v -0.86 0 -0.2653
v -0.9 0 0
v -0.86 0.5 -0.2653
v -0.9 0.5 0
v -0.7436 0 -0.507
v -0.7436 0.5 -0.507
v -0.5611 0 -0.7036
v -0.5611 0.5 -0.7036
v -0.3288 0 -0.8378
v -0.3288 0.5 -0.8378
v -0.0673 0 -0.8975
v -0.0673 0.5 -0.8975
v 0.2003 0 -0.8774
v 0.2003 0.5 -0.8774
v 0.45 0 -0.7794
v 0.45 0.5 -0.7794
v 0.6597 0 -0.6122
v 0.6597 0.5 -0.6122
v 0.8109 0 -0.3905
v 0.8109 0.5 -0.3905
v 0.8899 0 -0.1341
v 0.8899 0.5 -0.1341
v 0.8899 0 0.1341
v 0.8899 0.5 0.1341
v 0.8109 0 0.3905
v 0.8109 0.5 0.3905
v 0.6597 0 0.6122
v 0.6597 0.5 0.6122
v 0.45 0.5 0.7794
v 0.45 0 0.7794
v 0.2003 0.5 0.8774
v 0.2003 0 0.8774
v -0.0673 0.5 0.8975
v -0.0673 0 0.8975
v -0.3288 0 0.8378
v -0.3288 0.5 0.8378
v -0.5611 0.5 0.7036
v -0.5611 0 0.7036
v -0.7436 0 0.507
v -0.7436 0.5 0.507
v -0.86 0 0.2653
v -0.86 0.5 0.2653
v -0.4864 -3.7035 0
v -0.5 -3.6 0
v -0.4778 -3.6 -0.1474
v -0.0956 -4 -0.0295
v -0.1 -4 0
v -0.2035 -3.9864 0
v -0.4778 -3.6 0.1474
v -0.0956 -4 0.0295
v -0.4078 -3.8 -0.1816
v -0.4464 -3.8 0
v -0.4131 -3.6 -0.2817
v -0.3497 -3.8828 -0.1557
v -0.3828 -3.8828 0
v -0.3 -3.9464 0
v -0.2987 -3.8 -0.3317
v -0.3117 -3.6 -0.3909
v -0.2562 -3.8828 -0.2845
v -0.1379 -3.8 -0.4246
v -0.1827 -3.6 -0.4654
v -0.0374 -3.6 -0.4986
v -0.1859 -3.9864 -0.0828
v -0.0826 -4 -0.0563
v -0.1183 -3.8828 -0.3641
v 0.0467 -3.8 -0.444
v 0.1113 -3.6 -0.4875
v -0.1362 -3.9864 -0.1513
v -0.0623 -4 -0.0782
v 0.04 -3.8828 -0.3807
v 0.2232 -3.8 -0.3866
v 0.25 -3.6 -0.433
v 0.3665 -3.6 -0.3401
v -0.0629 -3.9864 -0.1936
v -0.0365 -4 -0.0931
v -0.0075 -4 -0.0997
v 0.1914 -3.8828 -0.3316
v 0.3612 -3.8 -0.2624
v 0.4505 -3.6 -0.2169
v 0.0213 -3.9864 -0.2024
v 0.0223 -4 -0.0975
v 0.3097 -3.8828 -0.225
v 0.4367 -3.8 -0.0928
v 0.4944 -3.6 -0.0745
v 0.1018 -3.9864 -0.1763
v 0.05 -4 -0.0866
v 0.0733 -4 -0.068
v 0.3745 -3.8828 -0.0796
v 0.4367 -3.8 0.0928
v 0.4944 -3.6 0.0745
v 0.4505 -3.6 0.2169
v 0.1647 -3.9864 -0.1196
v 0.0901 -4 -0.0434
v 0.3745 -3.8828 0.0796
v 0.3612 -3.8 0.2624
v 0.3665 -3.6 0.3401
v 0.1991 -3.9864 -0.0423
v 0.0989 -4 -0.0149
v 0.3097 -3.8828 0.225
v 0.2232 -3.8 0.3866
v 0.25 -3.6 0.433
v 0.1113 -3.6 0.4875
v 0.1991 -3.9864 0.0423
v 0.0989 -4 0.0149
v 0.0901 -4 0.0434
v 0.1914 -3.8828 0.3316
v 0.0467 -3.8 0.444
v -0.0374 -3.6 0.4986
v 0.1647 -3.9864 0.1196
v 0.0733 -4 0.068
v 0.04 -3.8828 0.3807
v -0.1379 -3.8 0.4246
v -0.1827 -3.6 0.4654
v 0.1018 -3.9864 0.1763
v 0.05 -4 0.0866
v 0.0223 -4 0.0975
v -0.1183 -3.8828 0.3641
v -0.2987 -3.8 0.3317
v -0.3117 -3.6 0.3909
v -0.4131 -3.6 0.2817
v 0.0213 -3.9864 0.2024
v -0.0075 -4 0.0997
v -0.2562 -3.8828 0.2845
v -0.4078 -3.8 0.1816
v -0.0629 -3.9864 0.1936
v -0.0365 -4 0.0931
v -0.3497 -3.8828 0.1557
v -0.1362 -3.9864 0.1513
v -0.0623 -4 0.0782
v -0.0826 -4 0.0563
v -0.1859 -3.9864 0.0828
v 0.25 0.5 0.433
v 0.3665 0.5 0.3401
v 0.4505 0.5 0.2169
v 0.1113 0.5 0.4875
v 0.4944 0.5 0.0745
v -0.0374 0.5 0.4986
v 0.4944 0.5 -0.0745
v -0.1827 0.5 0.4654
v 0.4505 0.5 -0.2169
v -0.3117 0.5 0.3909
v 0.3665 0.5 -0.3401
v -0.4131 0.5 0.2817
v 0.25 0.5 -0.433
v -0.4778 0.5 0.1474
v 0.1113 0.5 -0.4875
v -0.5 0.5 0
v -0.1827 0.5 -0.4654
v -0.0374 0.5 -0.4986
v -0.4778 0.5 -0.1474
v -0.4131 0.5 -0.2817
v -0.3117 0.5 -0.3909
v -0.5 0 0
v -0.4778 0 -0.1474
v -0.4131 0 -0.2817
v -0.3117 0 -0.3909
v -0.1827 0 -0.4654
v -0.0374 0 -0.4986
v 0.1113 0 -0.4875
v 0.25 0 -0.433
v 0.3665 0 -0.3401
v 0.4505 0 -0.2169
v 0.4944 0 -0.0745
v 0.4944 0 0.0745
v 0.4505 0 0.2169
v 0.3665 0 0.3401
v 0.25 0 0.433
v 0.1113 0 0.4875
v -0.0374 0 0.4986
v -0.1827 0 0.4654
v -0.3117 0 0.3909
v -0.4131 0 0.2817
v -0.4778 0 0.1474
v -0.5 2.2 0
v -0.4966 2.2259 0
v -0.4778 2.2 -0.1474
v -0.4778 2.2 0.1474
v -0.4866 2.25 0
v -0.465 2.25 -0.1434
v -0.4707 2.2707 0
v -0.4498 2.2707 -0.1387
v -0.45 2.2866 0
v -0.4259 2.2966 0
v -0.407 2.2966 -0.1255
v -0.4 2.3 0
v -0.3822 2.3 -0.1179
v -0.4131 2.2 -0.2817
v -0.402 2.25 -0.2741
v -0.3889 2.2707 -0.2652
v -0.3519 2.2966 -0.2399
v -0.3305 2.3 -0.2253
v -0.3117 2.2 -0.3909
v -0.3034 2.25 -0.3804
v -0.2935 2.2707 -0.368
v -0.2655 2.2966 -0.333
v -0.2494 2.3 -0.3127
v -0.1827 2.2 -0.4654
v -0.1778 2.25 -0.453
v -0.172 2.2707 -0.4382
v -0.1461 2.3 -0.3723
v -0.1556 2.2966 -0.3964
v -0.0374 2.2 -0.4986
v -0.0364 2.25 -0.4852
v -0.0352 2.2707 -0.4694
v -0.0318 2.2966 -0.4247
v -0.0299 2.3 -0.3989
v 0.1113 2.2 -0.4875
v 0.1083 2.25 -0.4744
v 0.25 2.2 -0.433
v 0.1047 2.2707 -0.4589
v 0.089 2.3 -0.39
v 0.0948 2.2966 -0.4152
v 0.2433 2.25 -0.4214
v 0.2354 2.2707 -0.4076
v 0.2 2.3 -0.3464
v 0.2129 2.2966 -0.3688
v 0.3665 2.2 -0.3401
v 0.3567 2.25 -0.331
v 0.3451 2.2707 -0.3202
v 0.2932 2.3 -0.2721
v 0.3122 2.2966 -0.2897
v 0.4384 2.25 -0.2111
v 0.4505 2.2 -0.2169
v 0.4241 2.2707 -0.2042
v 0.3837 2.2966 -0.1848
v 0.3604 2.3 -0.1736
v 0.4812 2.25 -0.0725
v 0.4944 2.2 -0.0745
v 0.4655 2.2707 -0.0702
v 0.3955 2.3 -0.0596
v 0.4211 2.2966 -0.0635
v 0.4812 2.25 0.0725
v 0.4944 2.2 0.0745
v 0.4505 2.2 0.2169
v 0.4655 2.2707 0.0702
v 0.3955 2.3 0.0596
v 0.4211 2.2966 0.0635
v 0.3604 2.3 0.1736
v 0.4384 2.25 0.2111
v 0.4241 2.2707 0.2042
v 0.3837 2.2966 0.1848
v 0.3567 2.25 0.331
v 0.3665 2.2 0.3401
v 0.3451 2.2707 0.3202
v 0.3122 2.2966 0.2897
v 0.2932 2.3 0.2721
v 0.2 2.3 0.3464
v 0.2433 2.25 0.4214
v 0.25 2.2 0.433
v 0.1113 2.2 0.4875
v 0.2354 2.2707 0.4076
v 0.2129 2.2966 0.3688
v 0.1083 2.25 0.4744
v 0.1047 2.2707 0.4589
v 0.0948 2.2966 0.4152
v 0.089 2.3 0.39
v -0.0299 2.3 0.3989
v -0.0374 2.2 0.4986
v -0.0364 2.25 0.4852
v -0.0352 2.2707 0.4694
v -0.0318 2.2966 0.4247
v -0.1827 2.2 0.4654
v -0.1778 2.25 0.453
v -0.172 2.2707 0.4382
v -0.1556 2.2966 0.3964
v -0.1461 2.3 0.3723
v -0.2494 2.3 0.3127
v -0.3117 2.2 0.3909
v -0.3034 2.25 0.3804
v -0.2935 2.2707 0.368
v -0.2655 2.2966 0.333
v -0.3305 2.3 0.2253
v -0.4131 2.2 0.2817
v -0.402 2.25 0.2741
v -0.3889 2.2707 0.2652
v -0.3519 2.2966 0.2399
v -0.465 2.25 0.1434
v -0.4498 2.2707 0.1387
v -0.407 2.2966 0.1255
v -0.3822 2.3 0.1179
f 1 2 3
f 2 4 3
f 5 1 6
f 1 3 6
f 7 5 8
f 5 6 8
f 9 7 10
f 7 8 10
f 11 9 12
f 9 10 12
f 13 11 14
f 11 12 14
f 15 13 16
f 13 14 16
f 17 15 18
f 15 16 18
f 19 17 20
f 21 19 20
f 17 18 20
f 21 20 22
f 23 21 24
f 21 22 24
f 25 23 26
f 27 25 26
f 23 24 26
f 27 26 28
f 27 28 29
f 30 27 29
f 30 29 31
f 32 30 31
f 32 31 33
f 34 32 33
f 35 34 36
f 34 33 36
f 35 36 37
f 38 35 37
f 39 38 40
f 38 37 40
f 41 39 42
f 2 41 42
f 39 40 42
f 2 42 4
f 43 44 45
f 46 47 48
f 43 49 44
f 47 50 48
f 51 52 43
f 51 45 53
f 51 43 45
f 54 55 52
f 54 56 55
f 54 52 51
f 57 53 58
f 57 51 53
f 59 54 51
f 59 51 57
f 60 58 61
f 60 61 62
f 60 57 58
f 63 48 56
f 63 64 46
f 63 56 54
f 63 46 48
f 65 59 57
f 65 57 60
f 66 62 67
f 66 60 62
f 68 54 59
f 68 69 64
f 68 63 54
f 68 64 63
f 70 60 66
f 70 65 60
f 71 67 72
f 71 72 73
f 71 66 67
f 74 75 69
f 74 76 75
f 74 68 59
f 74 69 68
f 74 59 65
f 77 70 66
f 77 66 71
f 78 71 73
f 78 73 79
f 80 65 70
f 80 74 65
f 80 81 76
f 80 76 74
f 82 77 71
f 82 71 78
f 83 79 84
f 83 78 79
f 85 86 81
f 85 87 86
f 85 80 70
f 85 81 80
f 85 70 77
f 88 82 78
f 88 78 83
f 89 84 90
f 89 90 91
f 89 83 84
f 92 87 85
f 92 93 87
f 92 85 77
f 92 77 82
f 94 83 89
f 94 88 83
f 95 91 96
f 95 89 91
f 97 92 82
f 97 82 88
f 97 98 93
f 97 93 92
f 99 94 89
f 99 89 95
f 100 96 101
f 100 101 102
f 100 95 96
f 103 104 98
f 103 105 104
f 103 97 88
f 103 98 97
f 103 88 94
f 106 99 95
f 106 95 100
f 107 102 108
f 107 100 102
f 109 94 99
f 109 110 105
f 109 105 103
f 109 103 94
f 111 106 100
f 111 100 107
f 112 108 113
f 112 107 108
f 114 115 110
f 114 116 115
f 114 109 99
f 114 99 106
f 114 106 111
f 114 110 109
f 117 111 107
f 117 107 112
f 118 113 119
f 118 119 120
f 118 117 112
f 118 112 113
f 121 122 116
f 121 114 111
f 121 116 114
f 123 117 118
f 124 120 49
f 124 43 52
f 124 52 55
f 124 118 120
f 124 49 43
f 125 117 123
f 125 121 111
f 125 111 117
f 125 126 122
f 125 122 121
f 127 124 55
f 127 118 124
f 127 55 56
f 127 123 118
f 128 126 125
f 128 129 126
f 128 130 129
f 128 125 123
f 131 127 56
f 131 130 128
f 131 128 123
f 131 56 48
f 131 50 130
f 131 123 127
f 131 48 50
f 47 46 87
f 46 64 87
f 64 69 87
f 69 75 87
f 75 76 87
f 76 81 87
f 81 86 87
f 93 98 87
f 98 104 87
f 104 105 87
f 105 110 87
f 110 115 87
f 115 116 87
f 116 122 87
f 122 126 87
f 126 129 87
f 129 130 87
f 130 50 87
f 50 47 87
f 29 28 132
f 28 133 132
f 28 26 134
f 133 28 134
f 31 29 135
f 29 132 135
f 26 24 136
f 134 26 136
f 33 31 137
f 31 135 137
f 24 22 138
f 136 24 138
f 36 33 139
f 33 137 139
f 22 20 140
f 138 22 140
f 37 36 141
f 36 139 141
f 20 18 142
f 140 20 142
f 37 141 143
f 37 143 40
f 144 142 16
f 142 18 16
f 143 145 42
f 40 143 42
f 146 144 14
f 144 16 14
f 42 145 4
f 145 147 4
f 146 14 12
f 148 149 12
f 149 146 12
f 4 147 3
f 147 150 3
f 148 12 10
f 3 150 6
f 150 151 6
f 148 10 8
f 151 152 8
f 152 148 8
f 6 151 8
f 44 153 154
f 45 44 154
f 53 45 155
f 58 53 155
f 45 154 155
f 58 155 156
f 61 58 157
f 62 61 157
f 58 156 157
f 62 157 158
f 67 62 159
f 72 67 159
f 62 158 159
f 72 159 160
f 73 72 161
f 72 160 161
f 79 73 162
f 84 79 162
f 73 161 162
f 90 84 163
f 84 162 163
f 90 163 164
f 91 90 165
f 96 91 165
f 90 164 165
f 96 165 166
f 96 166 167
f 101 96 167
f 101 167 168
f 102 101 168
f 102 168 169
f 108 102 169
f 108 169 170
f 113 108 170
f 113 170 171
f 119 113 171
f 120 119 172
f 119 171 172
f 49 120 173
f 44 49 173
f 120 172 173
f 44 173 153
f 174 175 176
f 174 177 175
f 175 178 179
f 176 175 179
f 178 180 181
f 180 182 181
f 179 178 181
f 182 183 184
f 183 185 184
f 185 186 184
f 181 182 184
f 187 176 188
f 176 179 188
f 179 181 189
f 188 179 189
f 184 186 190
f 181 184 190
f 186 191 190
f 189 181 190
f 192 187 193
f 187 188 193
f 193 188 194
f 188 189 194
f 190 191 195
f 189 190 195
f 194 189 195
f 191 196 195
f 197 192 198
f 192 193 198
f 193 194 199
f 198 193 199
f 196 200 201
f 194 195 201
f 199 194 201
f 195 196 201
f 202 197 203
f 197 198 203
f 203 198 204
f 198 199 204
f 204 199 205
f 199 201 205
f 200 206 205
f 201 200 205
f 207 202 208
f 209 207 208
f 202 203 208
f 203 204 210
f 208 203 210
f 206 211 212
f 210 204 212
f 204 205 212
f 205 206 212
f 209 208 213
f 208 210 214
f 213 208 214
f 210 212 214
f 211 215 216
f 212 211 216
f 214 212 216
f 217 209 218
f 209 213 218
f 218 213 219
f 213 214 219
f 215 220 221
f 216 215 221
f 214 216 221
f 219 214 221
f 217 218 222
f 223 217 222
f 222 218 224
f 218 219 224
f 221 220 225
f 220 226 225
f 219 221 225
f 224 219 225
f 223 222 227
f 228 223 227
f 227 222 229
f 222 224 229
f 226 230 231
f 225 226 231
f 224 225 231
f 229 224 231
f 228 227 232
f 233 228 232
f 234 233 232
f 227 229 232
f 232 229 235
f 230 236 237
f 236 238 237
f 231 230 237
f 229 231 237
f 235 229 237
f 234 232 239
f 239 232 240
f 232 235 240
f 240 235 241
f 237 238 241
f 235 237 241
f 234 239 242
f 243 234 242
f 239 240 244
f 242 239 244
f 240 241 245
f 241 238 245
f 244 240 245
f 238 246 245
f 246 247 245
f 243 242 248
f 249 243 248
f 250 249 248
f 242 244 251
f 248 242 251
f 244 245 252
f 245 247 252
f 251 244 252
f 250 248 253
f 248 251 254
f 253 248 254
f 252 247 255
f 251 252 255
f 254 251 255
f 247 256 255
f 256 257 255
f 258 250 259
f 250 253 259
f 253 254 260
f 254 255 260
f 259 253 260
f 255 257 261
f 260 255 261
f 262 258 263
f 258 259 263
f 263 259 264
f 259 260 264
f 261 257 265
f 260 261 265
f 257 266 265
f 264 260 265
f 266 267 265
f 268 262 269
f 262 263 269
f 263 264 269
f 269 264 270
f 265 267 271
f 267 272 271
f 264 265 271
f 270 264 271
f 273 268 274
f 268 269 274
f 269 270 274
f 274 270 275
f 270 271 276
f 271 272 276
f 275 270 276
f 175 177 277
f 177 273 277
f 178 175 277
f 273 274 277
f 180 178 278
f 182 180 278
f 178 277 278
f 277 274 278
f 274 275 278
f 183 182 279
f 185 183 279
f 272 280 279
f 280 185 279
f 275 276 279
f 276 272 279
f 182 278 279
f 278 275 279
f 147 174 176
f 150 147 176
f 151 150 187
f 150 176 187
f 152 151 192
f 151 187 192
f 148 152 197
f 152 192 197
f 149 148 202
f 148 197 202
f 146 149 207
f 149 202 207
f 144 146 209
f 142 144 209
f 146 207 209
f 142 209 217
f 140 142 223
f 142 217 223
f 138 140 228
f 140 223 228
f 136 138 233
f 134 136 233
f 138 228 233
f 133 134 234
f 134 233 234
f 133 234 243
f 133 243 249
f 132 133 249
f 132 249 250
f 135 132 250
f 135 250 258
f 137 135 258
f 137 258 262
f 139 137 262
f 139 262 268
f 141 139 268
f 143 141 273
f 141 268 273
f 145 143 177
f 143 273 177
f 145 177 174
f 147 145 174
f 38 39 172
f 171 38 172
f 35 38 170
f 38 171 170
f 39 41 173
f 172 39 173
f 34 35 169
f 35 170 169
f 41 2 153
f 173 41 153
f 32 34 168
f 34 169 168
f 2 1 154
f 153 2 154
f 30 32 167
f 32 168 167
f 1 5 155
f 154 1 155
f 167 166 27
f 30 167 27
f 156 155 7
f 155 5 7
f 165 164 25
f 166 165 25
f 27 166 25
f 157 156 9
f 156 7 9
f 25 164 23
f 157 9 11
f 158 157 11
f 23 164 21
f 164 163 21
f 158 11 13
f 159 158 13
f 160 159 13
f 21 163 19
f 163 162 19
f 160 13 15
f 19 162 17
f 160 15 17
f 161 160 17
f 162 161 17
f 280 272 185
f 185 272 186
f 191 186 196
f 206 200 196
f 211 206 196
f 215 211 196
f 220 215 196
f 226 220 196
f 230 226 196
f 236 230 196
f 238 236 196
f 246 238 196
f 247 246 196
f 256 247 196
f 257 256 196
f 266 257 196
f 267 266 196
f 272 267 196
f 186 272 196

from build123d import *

# Parameters (mm, degrees)
FILLET_1_R = 0.1
FILLET_2_R = 0.4


with BuildPart() as part:
    # 草图1 → 旋转1 (revolve)
    with BuildSketch(Plane.XY):
        Polygon((0, -4), (-0.5, -4), (-0.5, 0), (-0.9, 0), (-0.9, 0.5), (-0.5, 0.5), (-0.5, 2.3), (0, 2.3), align=None)
    revolve(axis=Axis((0, 13.687242456, 0), (0, -1, 0)))

    # 圆角1
    fillet_1_edges = [part.edges().sort_by_distance(p)[0] for p in [
        (0.5, 2.3, 0),
    ]]
    fillet(fillet_1_edges, radius=FILLET_1_R)

    # 圆角2
    fillet_2_edges = [part.edges().sort_by_distance(p)[0] for p in [
        (0.5, -4, 0),
    ]]
    fillet(fillet_2_edges, radius=FILLET_2_R)


solid = part.part
